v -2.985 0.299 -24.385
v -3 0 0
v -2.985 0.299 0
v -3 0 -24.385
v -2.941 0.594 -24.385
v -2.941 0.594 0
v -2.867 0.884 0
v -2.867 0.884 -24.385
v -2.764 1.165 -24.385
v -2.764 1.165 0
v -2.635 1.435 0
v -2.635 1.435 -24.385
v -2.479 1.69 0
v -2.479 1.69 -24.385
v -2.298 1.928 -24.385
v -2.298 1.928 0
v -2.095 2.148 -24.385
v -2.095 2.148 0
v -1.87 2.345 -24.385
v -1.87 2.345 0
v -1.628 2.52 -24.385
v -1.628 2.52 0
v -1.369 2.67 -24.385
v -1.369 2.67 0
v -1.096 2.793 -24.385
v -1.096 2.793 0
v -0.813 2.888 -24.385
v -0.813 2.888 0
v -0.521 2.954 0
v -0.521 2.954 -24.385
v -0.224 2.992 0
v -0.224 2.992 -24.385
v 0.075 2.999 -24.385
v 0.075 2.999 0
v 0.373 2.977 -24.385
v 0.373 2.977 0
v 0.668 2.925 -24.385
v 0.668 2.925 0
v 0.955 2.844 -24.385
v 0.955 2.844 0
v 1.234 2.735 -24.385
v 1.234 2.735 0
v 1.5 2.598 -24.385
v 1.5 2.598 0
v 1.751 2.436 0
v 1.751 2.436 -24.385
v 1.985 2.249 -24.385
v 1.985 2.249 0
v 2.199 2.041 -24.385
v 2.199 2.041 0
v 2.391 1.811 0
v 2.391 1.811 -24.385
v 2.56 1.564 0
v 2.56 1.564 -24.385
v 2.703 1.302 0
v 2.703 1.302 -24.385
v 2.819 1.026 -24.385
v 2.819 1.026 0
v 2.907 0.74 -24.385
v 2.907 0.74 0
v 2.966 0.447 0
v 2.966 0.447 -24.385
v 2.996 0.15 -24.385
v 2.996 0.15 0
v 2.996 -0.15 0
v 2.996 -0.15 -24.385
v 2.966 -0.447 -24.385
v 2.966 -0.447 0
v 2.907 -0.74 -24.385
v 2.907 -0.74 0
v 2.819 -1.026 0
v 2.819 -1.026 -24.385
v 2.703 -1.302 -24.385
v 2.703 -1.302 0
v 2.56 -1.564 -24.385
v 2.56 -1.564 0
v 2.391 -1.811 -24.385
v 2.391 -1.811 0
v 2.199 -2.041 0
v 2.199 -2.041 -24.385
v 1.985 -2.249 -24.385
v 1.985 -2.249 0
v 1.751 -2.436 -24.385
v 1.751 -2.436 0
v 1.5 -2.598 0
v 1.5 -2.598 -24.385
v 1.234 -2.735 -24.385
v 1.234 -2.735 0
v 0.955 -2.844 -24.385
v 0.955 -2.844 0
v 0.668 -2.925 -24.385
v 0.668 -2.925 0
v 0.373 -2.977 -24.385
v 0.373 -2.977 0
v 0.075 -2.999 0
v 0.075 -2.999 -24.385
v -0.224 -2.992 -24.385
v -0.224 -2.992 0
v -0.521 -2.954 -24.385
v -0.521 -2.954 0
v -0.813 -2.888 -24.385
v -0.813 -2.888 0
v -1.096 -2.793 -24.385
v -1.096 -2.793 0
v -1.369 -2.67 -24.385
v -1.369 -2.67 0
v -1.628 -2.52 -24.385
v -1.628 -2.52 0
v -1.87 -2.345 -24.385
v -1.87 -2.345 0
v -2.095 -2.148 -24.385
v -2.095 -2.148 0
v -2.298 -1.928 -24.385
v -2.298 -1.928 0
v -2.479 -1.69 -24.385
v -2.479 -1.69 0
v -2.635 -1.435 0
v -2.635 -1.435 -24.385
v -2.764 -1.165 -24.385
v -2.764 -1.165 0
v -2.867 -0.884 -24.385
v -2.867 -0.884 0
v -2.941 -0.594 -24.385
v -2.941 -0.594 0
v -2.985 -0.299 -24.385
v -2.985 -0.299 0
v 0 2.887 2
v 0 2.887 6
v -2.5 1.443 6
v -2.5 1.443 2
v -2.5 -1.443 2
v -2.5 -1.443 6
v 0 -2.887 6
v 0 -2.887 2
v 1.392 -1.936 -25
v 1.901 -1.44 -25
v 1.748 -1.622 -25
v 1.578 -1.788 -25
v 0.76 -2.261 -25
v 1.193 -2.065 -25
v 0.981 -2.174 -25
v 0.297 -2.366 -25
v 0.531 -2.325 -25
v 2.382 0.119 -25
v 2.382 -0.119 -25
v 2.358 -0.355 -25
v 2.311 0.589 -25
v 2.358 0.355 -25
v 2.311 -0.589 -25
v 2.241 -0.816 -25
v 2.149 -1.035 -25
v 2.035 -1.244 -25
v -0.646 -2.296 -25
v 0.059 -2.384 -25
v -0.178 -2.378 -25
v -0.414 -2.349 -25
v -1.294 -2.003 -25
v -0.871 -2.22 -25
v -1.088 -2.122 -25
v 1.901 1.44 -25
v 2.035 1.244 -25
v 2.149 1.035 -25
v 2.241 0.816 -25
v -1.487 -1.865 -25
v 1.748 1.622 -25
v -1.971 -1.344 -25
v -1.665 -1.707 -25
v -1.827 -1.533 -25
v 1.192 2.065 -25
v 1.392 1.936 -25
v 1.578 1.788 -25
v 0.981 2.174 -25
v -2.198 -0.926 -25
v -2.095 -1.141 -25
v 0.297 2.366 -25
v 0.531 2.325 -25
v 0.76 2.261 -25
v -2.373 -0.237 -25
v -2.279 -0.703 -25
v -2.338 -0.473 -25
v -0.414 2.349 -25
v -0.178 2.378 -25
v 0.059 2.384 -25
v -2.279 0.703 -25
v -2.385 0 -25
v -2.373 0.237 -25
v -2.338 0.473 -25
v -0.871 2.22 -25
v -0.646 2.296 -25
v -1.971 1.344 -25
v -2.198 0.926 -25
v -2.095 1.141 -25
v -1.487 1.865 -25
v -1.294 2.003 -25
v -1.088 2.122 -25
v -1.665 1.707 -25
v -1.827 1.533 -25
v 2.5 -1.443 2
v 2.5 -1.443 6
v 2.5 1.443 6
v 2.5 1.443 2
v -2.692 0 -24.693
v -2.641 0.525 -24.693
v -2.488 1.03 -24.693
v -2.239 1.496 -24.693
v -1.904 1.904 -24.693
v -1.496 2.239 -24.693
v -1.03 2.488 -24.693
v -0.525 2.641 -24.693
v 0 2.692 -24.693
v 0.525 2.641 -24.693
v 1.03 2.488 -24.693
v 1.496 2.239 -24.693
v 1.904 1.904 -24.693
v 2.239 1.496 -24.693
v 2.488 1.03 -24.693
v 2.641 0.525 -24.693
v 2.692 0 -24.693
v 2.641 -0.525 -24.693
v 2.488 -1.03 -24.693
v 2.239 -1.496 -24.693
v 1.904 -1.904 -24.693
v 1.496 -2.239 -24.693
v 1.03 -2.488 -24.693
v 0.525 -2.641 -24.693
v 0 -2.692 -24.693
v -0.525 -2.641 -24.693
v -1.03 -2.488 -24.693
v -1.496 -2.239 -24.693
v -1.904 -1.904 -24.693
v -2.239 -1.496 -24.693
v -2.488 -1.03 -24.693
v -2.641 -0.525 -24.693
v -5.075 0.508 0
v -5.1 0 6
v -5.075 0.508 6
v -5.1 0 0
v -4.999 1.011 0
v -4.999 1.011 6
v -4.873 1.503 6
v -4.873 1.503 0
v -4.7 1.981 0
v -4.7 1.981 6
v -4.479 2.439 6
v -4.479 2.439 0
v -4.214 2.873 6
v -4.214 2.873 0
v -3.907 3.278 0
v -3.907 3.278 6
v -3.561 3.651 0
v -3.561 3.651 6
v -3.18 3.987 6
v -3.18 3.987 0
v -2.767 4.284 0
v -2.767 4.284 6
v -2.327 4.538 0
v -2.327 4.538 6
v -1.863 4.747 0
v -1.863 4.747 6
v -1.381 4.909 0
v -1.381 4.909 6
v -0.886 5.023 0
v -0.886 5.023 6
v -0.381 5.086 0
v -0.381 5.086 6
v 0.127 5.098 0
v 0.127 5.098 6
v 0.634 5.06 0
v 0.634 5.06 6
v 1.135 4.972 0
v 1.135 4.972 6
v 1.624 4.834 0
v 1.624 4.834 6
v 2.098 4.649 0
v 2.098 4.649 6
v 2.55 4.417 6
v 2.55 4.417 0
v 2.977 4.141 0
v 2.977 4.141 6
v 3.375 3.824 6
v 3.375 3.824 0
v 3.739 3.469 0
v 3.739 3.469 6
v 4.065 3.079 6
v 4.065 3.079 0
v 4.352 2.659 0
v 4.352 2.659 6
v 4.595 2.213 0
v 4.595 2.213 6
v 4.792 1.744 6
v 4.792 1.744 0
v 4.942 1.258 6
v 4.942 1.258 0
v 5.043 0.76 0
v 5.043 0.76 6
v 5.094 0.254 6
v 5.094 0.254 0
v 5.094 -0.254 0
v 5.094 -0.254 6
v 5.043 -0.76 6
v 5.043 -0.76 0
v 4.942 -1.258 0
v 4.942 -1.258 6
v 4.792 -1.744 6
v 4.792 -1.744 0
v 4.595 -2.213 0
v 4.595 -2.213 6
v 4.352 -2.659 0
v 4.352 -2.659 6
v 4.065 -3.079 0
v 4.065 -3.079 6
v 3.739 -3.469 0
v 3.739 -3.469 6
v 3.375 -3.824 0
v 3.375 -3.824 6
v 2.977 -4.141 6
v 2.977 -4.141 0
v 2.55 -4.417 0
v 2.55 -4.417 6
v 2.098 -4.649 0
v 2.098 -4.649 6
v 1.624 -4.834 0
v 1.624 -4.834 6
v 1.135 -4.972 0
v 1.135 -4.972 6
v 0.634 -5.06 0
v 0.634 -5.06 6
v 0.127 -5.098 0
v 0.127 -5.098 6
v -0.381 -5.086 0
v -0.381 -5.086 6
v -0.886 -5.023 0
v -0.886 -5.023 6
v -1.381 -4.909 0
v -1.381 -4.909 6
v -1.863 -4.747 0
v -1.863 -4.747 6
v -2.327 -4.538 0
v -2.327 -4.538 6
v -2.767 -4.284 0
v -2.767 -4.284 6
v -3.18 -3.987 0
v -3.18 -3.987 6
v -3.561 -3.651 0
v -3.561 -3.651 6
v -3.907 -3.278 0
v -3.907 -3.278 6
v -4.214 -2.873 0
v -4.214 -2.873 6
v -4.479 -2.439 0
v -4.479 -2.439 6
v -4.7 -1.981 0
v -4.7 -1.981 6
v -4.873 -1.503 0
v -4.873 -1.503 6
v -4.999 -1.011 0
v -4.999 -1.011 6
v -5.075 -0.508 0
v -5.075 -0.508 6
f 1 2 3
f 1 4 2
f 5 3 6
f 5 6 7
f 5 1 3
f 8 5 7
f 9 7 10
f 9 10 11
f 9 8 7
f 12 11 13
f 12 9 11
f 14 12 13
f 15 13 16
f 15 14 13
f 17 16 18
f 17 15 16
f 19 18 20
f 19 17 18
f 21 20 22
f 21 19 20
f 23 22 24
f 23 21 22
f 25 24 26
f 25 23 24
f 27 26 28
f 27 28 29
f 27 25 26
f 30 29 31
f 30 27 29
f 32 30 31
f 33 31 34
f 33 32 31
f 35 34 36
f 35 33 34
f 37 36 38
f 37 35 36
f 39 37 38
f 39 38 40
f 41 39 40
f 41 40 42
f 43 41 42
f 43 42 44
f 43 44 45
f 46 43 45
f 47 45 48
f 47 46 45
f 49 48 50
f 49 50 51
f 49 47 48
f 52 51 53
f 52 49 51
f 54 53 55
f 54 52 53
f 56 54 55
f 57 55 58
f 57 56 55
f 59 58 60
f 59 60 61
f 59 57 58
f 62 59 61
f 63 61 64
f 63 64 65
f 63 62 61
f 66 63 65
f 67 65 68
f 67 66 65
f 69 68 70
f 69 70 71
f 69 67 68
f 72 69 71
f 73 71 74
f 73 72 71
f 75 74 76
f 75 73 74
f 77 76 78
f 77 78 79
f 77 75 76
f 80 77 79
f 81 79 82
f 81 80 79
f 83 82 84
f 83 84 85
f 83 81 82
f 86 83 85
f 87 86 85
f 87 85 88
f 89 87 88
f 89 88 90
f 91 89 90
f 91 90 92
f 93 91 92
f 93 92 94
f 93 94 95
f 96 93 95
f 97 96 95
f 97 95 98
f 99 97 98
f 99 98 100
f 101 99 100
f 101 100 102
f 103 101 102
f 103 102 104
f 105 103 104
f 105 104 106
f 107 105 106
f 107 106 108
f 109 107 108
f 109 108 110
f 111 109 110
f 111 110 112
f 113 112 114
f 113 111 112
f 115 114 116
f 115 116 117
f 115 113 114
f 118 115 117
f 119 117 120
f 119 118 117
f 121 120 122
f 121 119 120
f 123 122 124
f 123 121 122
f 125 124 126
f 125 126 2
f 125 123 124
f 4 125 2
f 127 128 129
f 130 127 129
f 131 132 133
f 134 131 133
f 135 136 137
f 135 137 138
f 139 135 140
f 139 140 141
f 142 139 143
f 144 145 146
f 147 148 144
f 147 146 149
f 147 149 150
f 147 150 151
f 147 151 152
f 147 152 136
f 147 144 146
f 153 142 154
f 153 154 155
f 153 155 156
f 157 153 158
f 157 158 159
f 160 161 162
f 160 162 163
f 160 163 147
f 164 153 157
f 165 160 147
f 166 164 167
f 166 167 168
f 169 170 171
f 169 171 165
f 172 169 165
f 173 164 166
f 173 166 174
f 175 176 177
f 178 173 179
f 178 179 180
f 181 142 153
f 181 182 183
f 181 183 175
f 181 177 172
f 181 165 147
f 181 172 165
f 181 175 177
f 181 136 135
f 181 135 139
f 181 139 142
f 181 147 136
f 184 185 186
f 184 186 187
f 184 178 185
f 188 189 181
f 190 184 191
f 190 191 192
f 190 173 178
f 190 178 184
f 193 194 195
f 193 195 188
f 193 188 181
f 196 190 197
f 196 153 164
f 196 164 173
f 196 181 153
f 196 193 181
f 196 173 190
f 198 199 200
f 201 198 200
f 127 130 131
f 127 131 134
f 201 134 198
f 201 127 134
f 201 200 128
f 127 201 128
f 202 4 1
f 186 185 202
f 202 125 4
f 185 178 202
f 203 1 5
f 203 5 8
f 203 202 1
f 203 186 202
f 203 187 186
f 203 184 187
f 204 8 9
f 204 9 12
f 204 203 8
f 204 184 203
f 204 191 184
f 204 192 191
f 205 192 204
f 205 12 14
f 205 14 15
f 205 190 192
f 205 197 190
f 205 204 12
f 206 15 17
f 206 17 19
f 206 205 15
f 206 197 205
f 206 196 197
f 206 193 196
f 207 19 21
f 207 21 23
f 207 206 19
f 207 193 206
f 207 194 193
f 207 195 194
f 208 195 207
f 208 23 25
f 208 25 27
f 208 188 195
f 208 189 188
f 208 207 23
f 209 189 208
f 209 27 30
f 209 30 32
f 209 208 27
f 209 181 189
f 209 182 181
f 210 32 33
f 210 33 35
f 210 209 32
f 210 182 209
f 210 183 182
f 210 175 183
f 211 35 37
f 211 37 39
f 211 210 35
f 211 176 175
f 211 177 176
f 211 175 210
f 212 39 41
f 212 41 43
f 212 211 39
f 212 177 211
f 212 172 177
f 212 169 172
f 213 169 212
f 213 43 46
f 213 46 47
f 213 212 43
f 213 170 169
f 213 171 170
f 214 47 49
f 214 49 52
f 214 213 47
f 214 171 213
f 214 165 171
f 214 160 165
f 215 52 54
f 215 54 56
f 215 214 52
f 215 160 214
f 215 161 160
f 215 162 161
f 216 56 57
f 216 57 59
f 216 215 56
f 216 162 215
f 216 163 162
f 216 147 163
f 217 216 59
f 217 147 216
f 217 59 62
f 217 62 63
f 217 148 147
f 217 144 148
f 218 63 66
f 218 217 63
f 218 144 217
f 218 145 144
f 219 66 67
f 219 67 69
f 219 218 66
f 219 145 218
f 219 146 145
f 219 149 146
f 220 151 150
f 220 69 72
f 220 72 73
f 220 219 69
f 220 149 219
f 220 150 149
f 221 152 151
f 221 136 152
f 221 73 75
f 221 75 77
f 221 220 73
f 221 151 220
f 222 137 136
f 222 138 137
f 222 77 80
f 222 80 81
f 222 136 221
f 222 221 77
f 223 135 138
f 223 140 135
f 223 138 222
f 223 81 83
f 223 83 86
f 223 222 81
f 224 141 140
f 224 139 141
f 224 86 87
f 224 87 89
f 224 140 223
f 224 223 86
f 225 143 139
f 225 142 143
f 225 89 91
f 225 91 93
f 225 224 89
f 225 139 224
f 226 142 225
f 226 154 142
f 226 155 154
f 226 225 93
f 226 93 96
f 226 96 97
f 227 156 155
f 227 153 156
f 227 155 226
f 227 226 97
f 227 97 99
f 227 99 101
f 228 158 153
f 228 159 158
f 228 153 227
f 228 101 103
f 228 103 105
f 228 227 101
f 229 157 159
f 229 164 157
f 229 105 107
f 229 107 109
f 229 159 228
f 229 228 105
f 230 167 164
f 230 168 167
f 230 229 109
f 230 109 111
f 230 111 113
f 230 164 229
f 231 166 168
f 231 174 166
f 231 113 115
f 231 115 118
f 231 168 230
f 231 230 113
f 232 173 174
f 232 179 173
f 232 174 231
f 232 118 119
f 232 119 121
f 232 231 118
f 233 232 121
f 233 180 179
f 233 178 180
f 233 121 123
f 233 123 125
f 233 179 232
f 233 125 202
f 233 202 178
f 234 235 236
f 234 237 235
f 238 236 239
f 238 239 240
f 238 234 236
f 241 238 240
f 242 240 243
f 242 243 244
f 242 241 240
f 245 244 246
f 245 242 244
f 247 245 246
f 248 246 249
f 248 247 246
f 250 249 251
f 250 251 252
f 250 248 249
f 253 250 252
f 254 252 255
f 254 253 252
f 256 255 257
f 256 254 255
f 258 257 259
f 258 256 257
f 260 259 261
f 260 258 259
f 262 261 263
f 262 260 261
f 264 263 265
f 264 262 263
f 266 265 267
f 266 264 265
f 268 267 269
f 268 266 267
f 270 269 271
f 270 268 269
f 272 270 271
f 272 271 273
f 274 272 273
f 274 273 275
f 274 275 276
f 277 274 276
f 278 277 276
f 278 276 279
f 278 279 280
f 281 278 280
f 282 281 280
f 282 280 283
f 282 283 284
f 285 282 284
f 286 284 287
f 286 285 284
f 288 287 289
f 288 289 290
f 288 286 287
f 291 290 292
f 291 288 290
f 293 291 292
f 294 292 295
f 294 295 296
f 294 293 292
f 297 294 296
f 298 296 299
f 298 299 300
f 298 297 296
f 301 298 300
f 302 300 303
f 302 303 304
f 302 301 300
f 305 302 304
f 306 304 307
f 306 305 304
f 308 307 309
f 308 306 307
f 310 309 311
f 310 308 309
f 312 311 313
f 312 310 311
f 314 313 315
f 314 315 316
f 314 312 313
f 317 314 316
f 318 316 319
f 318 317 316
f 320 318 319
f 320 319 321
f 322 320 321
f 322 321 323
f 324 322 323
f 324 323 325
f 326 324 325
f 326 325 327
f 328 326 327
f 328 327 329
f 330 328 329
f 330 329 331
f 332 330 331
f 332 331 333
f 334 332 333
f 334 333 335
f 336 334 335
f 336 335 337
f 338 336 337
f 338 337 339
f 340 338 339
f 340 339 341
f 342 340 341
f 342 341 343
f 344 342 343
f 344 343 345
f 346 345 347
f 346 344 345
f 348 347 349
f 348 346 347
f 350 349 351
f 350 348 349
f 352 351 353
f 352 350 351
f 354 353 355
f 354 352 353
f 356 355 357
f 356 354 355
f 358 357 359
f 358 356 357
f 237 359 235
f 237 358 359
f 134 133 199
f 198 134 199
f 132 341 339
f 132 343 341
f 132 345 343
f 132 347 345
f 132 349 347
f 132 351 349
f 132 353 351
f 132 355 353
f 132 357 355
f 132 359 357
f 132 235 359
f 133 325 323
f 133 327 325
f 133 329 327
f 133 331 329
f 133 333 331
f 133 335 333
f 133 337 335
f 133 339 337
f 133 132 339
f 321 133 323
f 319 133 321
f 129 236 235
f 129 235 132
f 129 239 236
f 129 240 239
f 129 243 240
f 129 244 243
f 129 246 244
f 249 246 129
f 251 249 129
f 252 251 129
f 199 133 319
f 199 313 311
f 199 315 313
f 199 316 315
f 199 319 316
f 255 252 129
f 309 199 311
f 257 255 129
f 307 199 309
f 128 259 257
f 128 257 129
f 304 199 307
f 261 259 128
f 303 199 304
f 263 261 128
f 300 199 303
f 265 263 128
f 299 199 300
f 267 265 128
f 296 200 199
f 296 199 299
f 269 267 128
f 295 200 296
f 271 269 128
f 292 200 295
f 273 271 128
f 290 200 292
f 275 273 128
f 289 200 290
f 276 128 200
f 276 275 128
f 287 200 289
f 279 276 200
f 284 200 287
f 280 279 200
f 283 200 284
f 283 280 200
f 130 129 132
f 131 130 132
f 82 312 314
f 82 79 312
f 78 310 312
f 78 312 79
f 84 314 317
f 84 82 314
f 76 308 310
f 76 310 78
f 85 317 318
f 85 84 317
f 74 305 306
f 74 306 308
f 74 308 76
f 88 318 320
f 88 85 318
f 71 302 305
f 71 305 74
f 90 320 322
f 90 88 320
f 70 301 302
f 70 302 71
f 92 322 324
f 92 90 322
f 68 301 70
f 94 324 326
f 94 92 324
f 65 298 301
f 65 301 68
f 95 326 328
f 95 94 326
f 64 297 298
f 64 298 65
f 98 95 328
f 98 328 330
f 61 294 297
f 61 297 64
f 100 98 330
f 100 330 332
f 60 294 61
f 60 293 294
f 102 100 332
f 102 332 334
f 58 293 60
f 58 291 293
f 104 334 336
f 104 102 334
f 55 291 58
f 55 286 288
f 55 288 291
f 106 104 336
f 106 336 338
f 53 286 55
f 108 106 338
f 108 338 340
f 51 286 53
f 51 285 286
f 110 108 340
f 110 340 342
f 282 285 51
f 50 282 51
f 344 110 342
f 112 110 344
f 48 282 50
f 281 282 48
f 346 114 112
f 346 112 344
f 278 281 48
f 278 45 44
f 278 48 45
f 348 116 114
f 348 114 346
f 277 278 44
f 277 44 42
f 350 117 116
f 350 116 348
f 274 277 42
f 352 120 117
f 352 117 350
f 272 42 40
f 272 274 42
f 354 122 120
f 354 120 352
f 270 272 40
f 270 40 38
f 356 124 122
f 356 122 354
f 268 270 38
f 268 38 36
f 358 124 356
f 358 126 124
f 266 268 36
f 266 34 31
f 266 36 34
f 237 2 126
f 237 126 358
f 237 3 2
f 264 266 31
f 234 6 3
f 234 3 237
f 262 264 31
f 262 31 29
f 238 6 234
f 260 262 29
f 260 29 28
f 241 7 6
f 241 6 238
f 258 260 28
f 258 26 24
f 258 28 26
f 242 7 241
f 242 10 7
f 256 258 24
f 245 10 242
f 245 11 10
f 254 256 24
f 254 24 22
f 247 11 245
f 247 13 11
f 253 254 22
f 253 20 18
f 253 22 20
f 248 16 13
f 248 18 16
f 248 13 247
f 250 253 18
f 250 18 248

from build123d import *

# Parameters (mm, degrees)
F4_DEPTH      = 4
F4_DEPTH_BACK = 4


with BuildPart() as f1:
    # F0 (on Front) → F1 (revolve)
    with BuildSketch(Plane.XZ):
        Polygon((0, 6), (-5.1, 6), (-5.1, 0), (-3, 0), (-3, -24.385), (-2.385, -25), (0, -25), align=None)
    revolve(axis=Axis((0, 0, -9.5), (0, 0, -1)))

    # F3 (on offset) → F4 (cut, two sides)
    with BuildSketch(Plane.XY.offset(6)) as f4_sk:
        Polygon((2.5, -1.443376), (2.5, 1.443376), (0, 2.886751), (-2.5, 1.443376), (-2.5, -1.443376), (0, -2.886751), align=None)
    extrude(amount=-F4_DEPTH, mode=Mode.SUBTRACT)
    extrude(f4_sk.sketch, amount=-F4_DEPTH_BACK, mode=Mode.SUBTRACT)


solid = f1.part
